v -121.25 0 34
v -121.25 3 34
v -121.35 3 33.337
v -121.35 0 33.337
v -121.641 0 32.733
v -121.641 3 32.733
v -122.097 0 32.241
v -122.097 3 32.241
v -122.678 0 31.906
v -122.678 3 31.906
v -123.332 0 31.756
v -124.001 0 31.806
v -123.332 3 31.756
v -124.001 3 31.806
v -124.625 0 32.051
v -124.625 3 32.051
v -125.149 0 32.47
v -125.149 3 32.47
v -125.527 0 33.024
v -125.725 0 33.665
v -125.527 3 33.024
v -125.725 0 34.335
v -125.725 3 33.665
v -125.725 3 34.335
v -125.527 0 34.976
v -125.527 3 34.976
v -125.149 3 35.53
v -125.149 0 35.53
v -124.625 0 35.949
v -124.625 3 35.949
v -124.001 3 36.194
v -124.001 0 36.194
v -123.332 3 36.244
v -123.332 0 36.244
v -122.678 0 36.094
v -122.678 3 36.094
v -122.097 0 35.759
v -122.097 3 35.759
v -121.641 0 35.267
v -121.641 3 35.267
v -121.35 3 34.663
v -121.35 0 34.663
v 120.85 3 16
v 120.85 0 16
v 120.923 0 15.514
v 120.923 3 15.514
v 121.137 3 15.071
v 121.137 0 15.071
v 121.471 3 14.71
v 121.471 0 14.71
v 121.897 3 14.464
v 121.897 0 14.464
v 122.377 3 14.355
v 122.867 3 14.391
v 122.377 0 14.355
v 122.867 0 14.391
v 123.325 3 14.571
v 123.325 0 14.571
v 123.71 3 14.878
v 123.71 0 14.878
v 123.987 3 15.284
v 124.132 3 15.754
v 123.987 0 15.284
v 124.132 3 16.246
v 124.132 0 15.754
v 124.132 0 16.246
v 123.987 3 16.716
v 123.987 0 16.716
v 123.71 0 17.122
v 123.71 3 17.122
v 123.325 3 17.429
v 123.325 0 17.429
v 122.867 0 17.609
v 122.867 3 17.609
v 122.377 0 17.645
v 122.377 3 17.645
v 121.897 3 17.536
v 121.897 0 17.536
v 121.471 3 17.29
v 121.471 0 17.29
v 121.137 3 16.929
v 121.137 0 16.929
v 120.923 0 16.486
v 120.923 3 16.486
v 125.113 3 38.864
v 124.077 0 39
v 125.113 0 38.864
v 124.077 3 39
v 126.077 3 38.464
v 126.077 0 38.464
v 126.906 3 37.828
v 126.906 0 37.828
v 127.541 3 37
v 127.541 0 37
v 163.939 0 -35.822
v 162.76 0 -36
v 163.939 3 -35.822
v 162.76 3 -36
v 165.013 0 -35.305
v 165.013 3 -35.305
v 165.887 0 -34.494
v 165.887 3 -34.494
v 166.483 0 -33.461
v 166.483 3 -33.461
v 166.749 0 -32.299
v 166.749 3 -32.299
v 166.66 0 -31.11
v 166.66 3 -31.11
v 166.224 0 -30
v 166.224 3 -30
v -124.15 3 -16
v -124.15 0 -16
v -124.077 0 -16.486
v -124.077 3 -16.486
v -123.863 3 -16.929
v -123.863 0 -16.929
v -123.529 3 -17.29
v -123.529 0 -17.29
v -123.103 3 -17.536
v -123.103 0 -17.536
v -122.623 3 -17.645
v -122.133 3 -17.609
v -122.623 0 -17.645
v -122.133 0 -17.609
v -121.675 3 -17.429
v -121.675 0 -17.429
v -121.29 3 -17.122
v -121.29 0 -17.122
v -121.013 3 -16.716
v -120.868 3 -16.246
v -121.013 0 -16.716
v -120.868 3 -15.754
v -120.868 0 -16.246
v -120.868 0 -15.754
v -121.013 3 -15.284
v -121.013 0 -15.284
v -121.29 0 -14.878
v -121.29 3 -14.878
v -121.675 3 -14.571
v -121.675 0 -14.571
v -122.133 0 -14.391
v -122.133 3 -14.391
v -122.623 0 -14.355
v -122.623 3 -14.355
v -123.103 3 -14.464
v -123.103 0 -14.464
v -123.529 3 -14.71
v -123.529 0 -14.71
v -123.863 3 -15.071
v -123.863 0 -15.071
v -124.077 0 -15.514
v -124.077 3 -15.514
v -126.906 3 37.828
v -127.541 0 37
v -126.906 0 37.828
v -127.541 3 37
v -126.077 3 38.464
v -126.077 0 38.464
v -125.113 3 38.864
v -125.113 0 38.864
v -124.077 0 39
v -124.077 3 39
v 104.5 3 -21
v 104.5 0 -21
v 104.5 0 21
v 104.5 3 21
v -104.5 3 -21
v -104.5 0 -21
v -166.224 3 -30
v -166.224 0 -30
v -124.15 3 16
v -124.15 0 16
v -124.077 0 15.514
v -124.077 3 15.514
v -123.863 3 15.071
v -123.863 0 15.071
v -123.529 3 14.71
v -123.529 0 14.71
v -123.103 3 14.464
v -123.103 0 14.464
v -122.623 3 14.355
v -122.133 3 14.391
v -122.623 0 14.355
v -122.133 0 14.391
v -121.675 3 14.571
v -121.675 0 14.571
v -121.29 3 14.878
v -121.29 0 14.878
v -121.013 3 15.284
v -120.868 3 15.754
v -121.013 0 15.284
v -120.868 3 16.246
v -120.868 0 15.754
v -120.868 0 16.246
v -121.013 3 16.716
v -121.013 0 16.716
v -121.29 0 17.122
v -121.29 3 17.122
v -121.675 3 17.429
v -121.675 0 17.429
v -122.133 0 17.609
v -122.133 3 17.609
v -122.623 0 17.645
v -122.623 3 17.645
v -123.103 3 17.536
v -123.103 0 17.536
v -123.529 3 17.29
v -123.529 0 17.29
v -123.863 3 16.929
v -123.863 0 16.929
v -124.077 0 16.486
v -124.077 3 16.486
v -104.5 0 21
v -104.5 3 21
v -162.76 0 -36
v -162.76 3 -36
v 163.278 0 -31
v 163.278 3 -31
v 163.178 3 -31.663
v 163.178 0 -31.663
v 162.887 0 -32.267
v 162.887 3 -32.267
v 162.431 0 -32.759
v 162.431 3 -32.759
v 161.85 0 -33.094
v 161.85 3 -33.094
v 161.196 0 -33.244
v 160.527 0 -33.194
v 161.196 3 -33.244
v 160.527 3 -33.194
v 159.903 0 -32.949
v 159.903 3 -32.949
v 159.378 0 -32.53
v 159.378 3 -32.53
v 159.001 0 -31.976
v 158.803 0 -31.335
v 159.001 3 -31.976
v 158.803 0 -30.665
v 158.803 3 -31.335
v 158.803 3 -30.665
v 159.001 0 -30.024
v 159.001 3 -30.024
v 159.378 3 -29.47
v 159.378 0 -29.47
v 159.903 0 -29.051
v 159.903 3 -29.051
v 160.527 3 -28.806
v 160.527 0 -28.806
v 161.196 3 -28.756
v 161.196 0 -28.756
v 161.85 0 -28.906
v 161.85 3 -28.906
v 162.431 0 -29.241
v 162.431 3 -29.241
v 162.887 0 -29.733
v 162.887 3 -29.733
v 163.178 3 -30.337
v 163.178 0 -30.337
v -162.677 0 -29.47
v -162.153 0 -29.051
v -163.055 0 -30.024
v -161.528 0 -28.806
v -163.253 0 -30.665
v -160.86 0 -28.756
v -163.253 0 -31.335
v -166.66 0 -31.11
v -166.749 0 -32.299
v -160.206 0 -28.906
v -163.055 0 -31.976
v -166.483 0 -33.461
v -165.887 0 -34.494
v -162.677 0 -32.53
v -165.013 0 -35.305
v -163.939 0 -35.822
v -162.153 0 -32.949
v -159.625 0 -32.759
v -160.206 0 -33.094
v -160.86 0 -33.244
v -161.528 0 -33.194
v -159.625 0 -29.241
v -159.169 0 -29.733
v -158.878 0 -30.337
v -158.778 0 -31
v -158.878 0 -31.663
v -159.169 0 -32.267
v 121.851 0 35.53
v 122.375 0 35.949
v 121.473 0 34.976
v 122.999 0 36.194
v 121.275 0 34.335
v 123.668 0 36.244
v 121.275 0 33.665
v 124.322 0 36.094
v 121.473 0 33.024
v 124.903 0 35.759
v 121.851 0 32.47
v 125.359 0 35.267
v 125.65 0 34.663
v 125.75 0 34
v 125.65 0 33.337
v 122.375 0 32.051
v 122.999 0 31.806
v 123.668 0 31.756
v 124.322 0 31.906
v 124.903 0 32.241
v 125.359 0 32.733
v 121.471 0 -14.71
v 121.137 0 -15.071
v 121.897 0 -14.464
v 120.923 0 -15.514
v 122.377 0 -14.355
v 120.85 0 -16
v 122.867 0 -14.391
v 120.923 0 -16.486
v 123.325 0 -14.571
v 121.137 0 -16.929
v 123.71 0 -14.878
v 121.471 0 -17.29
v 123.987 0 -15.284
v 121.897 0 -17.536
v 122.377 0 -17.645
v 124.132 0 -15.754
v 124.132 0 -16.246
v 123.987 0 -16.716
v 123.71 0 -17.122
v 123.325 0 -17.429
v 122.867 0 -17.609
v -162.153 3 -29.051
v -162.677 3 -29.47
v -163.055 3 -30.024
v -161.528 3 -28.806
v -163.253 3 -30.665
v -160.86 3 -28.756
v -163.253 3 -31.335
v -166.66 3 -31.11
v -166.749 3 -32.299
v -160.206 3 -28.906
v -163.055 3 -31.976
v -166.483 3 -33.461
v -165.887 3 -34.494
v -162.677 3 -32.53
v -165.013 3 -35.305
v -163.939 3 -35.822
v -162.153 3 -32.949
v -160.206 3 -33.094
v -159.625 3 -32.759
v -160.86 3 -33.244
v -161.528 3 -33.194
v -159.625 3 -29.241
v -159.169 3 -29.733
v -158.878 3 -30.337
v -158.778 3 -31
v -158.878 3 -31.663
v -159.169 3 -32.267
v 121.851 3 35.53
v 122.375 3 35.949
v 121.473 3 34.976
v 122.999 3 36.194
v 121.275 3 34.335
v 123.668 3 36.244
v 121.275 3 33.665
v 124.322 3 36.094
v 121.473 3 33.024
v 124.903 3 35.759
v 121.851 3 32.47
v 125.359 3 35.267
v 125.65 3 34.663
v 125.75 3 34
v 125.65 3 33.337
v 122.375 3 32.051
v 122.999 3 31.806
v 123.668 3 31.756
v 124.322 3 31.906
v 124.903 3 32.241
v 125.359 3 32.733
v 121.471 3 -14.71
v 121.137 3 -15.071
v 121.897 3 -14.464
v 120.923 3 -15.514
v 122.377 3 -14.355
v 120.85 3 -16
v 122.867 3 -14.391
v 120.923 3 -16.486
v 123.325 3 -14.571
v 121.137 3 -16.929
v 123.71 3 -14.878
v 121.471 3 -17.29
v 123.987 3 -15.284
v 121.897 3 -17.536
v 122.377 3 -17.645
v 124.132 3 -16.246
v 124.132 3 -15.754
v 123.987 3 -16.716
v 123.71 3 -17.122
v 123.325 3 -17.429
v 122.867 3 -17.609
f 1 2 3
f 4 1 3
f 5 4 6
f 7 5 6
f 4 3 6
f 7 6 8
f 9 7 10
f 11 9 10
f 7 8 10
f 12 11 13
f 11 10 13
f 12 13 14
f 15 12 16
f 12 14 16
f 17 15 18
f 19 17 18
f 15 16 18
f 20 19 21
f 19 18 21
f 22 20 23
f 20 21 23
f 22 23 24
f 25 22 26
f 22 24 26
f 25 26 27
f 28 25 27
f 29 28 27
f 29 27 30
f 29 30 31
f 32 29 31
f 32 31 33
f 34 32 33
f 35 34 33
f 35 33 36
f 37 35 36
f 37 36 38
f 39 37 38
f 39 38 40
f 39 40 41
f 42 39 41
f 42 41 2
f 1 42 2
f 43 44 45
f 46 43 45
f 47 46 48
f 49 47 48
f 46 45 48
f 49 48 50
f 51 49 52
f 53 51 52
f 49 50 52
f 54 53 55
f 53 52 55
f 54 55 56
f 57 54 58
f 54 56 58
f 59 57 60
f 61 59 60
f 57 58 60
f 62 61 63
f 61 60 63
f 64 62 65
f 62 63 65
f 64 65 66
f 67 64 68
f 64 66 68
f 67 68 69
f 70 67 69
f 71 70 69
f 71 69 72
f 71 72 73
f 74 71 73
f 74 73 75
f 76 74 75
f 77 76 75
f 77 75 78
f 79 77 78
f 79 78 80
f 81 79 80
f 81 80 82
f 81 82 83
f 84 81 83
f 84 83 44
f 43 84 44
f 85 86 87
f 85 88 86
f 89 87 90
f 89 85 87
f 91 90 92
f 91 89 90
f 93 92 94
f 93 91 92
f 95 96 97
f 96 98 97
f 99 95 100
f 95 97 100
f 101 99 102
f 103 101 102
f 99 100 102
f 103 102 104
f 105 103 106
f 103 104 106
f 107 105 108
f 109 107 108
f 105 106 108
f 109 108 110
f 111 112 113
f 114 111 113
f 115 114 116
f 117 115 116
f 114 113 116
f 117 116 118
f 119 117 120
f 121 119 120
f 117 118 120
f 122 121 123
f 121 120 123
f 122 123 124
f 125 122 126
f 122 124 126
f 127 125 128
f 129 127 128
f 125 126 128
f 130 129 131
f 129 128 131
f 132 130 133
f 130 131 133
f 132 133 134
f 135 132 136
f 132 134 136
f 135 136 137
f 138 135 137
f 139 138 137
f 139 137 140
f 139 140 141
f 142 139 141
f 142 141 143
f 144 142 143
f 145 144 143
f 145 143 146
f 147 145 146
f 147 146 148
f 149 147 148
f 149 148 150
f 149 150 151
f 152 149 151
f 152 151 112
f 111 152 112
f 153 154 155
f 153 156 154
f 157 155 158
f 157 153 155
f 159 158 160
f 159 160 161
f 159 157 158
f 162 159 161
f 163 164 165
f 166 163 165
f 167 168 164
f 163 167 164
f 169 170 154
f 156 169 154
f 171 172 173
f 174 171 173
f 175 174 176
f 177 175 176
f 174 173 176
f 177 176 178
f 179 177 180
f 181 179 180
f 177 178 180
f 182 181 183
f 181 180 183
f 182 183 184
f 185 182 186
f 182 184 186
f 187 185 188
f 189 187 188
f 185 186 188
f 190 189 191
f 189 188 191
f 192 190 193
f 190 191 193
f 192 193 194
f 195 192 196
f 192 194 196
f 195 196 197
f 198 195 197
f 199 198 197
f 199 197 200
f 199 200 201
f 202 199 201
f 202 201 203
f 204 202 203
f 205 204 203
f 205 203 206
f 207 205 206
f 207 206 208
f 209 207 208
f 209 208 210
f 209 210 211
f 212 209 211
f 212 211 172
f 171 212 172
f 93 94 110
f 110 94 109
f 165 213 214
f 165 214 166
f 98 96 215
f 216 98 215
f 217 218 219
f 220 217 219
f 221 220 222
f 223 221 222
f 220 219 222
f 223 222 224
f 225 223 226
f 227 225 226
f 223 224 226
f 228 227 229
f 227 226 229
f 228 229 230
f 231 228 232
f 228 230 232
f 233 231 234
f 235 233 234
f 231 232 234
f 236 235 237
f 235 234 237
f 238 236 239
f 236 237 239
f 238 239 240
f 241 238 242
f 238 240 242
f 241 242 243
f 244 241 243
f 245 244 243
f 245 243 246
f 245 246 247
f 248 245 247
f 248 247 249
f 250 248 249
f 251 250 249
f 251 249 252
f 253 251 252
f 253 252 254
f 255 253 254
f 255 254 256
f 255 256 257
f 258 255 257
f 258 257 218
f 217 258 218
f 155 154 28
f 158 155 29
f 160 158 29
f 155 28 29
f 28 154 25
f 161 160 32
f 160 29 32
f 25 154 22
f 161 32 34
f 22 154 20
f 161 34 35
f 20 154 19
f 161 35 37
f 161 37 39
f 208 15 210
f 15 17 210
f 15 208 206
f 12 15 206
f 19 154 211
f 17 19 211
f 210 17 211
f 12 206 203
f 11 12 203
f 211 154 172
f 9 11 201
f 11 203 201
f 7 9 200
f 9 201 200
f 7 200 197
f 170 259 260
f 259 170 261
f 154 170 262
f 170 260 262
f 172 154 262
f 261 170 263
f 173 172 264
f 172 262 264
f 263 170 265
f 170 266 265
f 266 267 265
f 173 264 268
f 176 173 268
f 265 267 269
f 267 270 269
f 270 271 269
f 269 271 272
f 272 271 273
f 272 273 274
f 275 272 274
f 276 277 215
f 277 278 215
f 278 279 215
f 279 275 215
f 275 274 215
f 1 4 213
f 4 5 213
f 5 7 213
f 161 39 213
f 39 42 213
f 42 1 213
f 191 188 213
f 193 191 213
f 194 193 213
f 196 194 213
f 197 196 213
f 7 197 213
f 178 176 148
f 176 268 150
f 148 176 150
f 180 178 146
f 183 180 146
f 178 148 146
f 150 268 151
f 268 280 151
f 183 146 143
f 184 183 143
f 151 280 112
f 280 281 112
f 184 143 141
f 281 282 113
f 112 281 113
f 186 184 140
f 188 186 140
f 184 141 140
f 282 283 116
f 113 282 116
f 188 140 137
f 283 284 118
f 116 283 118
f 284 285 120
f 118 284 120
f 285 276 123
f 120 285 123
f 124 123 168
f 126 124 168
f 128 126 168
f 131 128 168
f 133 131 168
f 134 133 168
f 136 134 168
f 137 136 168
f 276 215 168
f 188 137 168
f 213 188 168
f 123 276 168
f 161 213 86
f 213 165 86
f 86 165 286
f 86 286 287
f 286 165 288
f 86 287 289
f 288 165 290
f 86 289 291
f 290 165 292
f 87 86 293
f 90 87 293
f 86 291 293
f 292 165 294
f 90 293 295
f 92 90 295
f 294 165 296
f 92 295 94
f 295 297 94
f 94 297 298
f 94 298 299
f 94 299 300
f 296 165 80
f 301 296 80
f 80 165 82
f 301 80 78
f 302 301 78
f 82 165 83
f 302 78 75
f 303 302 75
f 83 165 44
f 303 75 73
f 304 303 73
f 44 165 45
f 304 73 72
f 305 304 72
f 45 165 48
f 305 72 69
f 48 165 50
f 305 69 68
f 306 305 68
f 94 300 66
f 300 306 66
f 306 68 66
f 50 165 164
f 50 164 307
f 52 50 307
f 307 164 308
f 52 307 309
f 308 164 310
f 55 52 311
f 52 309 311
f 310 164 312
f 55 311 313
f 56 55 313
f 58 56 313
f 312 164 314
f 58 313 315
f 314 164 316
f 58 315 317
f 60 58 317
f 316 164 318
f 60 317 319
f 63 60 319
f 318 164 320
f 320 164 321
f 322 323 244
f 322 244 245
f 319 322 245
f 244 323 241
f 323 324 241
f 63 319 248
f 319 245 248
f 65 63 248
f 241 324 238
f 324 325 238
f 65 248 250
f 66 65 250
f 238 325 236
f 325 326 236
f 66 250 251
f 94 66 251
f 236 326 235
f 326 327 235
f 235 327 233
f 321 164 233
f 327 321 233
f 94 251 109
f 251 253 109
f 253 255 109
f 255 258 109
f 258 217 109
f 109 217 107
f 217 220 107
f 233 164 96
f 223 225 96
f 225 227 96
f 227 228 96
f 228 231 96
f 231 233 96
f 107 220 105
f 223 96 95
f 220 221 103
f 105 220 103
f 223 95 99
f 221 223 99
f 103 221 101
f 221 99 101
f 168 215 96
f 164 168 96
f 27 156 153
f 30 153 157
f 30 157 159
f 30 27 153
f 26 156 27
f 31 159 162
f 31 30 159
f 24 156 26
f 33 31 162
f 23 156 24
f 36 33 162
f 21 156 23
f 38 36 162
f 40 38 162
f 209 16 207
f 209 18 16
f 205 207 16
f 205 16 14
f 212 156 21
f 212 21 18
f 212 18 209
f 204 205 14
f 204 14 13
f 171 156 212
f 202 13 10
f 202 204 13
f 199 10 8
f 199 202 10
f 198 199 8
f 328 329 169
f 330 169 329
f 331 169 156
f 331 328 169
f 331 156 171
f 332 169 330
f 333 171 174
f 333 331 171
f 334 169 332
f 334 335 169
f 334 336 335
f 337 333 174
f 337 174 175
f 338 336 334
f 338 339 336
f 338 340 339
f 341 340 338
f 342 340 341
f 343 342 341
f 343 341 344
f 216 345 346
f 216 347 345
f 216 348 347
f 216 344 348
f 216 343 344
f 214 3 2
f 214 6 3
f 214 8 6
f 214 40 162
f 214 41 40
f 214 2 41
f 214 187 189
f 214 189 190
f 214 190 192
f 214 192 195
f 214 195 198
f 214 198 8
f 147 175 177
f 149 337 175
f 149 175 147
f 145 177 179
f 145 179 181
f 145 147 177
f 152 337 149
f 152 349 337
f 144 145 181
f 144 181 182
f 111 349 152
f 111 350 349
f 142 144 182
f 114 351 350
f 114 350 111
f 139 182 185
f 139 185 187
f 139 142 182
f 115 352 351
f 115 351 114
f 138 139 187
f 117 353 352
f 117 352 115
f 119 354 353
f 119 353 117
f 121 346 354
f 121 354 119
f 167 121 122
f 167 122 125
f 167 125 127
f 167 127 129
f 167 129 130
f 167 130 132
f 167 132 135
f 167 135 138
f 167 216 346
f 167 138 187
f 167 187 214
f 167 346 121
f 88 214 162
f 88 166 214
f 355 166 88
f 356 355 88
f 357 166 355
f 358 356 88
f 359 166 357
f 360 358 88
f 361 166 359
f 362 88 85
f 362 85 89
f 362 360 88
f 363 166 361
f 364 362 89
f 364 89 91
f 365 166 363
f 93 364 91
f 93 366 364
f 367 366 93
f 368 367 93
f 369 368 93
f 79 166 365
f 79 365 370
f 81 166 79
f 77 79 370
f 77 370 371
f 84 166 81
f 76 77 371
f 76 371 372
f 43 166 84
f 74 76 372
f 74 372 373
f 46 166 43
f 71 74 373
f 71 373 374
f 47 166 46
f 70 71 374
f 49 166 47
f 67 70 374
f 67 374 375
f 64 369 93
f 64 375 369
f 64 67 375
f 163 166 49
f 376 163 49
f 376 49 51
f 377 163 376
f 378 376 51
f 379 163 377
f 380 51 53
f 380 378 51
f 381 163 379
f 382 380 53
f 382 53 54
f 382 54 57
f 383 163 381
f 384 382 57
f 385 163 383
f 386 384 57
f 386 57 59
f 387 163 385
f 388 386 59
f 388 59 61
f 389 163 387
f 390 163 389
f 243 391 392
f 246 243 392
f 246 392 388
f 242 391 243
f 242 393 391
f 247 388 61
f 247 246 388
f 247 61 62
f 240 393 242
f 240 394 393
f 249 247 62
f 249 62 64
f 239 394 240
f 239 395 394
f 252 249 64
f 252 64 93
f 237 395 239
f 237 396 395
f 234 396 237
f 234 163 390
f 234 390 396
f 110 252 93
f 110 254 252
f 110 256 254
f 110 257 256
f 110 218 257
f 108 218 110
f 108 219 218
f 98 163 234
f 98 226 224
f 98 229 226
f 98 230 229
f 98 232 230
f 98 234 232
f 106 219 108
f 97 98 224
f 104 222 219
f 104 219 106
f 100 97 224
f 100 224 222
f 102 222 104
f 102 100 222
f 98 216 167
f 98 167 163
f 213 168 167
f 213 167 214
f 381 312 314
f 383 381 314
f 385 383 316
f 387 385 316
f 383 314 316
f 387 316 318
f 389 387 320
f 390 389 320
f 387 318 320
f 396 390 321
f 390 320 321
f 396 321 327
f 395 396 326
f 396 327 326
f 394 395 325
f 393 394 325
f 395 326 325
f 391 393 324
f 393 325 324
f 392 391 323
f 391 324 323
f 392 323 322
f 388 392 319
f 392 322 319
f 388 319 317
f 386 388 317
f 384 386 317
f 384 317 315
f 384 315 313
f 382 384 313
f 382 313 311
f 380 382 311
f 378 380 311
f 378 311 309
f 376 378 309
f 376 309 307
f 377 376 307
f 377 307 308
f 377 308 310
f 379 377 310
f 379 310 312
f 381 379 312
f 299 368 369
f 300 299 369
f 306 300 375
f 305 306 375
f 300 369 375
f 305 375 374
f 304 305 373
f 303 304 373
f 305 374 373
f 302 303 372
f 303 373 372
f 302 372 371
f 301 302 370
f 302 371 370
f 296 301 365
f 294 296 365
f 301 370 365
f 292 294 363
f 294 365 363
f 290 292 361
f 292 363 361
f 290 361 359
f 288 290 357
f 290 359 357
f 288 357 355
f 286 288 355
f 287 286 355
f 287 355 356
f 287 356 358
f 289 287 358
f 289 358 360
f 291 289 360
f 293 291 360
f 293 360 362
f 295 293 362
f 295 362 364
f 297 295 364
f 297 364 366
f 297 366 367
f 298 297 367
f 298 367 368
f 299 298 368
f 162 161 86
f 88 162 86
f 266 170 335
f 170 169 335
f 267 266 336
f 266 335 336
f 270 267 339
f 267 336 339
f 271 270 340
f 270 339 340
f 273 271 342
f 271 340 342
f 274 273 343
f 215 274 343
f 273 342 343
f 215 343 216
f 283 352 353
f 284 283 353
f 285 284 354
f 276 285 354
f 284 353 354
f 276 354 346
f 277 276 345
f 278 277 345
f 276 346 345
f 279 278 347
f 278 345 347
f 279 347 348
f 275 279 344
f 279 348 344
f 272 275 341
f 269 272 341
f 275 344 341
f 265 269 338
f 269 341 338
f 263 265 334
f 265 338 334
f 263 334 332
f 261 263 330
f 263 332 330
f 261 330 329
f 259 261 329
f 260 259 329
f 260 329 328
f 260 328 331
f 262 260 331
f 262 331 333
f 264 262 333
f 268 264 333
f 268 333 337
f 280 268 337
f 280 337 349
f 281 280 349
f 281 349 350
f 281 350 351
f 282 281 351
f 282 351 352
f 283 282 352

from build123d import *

# Parameters (mm, degrees)
EXTRUDE_1_DEPTH        = 3
HOLE_WIZARD_M4_1_D     = 3.3
HOLE_WIZARD_M4_1_DEPTH = 11.5
HOLE_WIZARD_M4_1_TIP   = 0.991420021
HOLE_WIZARD_M4_2_D     = 4.5
HOLE_WIZARD_M4_2_DEPTH = 8
HOLE_WIZARD_M4_2_TIP   = 1.351936393
FILLET_1_R             = 4
SKETCH_9_W             = 209
SKETCH_9_H             = 42
CUT_EXTRUDE_1_DEPTH    = 172.28583421


with BuildPart() as part:
    # 草图1 → 凸台-拉伸1 (new body)
    with BuildSketch(Plane(origin=(0, 0, 0), x_dir=(1, 0, 0), z_dir=(0, 1, 0))):
        Polygon((-169.688021535, 36), (-126.386751346, -39), (126.386751346, -39), (169.688021535, 36), align=None)
    extrude(amount=EXTRUDE_1_DEPTH)

    # M4 螺纹孔1
    with Locations(Plane(origin=(0, 3, 0), x_dir=(1, 0, 0), z_dir=(0, 1, 0))):
        with Locations((122.5, 16), (-122.5, -16), (-122.5, 16), (122.5, -16)):
            Hole(HOLE_WIZARD_M4_1_D / 2, depth=HOLE_WIZARD_M4_1_DEPTH)
            with Locations((0, 0, -(HOLE_WIZARD_M4_1_DEPTH + HOLE_WIZARD_M4_1_TIP / 2))):  # 118° drill point
                Cone(0, HOLE_WIZARD_M4_1_D / 2, HOLE_WIZARD_M4_1_TIP, mode=Mode.SUBTRACT)

    # M4 间隙孔2
    with Locations(Plane(origin=(0, 0, 0), x_dir=(-1, 0, 0), z_dir=(0, -1, 0))):
        with Locations((-123.5, -34), (123.5, -34), (161.027767497, 31), (-161.027767497, 31)):
            Hole(HOLE_WIZARD_M4_2_D / 2, depth=HOLE_WIZARD_M4_2_DEPTH)
            with Locations((0, 0, -(HOLE_WIZARD_M4_2_DEPTH + HOLE_WIZARD_M4_2_TIP / 2))):  # 118° drill point
                Cone(0, HOLE_WIZARD_M4_2_D / 2, HOLE_WIZARD_M4_2_TIP, mode=Mode.SUBTRACT)

    # 圆角1
    fillet_1_edges = [part.edges().sort_by_distance(p)[0] for p in [
        (169.688021535, 1.5, -36),
        (126.386751346, 1.5, 39),
        (-126.386751346, 1.5, 39),
        (-169.688021535, 1.5, -36),
    ]]
    fillet(fillet_1_edges, radius=FILLET_1_R)

    # 草图9 → 切除-拉伸1 (cut, through all)
    with BuildSketch(Plane.XZ):
        Rectangle(SKETCH_9_W, SKETCH_9_H)
    extrude(amount=-CUT_EXTRUDE_1_DEPTH, mode=Mode.SUBTRACT)


solid = part.part
